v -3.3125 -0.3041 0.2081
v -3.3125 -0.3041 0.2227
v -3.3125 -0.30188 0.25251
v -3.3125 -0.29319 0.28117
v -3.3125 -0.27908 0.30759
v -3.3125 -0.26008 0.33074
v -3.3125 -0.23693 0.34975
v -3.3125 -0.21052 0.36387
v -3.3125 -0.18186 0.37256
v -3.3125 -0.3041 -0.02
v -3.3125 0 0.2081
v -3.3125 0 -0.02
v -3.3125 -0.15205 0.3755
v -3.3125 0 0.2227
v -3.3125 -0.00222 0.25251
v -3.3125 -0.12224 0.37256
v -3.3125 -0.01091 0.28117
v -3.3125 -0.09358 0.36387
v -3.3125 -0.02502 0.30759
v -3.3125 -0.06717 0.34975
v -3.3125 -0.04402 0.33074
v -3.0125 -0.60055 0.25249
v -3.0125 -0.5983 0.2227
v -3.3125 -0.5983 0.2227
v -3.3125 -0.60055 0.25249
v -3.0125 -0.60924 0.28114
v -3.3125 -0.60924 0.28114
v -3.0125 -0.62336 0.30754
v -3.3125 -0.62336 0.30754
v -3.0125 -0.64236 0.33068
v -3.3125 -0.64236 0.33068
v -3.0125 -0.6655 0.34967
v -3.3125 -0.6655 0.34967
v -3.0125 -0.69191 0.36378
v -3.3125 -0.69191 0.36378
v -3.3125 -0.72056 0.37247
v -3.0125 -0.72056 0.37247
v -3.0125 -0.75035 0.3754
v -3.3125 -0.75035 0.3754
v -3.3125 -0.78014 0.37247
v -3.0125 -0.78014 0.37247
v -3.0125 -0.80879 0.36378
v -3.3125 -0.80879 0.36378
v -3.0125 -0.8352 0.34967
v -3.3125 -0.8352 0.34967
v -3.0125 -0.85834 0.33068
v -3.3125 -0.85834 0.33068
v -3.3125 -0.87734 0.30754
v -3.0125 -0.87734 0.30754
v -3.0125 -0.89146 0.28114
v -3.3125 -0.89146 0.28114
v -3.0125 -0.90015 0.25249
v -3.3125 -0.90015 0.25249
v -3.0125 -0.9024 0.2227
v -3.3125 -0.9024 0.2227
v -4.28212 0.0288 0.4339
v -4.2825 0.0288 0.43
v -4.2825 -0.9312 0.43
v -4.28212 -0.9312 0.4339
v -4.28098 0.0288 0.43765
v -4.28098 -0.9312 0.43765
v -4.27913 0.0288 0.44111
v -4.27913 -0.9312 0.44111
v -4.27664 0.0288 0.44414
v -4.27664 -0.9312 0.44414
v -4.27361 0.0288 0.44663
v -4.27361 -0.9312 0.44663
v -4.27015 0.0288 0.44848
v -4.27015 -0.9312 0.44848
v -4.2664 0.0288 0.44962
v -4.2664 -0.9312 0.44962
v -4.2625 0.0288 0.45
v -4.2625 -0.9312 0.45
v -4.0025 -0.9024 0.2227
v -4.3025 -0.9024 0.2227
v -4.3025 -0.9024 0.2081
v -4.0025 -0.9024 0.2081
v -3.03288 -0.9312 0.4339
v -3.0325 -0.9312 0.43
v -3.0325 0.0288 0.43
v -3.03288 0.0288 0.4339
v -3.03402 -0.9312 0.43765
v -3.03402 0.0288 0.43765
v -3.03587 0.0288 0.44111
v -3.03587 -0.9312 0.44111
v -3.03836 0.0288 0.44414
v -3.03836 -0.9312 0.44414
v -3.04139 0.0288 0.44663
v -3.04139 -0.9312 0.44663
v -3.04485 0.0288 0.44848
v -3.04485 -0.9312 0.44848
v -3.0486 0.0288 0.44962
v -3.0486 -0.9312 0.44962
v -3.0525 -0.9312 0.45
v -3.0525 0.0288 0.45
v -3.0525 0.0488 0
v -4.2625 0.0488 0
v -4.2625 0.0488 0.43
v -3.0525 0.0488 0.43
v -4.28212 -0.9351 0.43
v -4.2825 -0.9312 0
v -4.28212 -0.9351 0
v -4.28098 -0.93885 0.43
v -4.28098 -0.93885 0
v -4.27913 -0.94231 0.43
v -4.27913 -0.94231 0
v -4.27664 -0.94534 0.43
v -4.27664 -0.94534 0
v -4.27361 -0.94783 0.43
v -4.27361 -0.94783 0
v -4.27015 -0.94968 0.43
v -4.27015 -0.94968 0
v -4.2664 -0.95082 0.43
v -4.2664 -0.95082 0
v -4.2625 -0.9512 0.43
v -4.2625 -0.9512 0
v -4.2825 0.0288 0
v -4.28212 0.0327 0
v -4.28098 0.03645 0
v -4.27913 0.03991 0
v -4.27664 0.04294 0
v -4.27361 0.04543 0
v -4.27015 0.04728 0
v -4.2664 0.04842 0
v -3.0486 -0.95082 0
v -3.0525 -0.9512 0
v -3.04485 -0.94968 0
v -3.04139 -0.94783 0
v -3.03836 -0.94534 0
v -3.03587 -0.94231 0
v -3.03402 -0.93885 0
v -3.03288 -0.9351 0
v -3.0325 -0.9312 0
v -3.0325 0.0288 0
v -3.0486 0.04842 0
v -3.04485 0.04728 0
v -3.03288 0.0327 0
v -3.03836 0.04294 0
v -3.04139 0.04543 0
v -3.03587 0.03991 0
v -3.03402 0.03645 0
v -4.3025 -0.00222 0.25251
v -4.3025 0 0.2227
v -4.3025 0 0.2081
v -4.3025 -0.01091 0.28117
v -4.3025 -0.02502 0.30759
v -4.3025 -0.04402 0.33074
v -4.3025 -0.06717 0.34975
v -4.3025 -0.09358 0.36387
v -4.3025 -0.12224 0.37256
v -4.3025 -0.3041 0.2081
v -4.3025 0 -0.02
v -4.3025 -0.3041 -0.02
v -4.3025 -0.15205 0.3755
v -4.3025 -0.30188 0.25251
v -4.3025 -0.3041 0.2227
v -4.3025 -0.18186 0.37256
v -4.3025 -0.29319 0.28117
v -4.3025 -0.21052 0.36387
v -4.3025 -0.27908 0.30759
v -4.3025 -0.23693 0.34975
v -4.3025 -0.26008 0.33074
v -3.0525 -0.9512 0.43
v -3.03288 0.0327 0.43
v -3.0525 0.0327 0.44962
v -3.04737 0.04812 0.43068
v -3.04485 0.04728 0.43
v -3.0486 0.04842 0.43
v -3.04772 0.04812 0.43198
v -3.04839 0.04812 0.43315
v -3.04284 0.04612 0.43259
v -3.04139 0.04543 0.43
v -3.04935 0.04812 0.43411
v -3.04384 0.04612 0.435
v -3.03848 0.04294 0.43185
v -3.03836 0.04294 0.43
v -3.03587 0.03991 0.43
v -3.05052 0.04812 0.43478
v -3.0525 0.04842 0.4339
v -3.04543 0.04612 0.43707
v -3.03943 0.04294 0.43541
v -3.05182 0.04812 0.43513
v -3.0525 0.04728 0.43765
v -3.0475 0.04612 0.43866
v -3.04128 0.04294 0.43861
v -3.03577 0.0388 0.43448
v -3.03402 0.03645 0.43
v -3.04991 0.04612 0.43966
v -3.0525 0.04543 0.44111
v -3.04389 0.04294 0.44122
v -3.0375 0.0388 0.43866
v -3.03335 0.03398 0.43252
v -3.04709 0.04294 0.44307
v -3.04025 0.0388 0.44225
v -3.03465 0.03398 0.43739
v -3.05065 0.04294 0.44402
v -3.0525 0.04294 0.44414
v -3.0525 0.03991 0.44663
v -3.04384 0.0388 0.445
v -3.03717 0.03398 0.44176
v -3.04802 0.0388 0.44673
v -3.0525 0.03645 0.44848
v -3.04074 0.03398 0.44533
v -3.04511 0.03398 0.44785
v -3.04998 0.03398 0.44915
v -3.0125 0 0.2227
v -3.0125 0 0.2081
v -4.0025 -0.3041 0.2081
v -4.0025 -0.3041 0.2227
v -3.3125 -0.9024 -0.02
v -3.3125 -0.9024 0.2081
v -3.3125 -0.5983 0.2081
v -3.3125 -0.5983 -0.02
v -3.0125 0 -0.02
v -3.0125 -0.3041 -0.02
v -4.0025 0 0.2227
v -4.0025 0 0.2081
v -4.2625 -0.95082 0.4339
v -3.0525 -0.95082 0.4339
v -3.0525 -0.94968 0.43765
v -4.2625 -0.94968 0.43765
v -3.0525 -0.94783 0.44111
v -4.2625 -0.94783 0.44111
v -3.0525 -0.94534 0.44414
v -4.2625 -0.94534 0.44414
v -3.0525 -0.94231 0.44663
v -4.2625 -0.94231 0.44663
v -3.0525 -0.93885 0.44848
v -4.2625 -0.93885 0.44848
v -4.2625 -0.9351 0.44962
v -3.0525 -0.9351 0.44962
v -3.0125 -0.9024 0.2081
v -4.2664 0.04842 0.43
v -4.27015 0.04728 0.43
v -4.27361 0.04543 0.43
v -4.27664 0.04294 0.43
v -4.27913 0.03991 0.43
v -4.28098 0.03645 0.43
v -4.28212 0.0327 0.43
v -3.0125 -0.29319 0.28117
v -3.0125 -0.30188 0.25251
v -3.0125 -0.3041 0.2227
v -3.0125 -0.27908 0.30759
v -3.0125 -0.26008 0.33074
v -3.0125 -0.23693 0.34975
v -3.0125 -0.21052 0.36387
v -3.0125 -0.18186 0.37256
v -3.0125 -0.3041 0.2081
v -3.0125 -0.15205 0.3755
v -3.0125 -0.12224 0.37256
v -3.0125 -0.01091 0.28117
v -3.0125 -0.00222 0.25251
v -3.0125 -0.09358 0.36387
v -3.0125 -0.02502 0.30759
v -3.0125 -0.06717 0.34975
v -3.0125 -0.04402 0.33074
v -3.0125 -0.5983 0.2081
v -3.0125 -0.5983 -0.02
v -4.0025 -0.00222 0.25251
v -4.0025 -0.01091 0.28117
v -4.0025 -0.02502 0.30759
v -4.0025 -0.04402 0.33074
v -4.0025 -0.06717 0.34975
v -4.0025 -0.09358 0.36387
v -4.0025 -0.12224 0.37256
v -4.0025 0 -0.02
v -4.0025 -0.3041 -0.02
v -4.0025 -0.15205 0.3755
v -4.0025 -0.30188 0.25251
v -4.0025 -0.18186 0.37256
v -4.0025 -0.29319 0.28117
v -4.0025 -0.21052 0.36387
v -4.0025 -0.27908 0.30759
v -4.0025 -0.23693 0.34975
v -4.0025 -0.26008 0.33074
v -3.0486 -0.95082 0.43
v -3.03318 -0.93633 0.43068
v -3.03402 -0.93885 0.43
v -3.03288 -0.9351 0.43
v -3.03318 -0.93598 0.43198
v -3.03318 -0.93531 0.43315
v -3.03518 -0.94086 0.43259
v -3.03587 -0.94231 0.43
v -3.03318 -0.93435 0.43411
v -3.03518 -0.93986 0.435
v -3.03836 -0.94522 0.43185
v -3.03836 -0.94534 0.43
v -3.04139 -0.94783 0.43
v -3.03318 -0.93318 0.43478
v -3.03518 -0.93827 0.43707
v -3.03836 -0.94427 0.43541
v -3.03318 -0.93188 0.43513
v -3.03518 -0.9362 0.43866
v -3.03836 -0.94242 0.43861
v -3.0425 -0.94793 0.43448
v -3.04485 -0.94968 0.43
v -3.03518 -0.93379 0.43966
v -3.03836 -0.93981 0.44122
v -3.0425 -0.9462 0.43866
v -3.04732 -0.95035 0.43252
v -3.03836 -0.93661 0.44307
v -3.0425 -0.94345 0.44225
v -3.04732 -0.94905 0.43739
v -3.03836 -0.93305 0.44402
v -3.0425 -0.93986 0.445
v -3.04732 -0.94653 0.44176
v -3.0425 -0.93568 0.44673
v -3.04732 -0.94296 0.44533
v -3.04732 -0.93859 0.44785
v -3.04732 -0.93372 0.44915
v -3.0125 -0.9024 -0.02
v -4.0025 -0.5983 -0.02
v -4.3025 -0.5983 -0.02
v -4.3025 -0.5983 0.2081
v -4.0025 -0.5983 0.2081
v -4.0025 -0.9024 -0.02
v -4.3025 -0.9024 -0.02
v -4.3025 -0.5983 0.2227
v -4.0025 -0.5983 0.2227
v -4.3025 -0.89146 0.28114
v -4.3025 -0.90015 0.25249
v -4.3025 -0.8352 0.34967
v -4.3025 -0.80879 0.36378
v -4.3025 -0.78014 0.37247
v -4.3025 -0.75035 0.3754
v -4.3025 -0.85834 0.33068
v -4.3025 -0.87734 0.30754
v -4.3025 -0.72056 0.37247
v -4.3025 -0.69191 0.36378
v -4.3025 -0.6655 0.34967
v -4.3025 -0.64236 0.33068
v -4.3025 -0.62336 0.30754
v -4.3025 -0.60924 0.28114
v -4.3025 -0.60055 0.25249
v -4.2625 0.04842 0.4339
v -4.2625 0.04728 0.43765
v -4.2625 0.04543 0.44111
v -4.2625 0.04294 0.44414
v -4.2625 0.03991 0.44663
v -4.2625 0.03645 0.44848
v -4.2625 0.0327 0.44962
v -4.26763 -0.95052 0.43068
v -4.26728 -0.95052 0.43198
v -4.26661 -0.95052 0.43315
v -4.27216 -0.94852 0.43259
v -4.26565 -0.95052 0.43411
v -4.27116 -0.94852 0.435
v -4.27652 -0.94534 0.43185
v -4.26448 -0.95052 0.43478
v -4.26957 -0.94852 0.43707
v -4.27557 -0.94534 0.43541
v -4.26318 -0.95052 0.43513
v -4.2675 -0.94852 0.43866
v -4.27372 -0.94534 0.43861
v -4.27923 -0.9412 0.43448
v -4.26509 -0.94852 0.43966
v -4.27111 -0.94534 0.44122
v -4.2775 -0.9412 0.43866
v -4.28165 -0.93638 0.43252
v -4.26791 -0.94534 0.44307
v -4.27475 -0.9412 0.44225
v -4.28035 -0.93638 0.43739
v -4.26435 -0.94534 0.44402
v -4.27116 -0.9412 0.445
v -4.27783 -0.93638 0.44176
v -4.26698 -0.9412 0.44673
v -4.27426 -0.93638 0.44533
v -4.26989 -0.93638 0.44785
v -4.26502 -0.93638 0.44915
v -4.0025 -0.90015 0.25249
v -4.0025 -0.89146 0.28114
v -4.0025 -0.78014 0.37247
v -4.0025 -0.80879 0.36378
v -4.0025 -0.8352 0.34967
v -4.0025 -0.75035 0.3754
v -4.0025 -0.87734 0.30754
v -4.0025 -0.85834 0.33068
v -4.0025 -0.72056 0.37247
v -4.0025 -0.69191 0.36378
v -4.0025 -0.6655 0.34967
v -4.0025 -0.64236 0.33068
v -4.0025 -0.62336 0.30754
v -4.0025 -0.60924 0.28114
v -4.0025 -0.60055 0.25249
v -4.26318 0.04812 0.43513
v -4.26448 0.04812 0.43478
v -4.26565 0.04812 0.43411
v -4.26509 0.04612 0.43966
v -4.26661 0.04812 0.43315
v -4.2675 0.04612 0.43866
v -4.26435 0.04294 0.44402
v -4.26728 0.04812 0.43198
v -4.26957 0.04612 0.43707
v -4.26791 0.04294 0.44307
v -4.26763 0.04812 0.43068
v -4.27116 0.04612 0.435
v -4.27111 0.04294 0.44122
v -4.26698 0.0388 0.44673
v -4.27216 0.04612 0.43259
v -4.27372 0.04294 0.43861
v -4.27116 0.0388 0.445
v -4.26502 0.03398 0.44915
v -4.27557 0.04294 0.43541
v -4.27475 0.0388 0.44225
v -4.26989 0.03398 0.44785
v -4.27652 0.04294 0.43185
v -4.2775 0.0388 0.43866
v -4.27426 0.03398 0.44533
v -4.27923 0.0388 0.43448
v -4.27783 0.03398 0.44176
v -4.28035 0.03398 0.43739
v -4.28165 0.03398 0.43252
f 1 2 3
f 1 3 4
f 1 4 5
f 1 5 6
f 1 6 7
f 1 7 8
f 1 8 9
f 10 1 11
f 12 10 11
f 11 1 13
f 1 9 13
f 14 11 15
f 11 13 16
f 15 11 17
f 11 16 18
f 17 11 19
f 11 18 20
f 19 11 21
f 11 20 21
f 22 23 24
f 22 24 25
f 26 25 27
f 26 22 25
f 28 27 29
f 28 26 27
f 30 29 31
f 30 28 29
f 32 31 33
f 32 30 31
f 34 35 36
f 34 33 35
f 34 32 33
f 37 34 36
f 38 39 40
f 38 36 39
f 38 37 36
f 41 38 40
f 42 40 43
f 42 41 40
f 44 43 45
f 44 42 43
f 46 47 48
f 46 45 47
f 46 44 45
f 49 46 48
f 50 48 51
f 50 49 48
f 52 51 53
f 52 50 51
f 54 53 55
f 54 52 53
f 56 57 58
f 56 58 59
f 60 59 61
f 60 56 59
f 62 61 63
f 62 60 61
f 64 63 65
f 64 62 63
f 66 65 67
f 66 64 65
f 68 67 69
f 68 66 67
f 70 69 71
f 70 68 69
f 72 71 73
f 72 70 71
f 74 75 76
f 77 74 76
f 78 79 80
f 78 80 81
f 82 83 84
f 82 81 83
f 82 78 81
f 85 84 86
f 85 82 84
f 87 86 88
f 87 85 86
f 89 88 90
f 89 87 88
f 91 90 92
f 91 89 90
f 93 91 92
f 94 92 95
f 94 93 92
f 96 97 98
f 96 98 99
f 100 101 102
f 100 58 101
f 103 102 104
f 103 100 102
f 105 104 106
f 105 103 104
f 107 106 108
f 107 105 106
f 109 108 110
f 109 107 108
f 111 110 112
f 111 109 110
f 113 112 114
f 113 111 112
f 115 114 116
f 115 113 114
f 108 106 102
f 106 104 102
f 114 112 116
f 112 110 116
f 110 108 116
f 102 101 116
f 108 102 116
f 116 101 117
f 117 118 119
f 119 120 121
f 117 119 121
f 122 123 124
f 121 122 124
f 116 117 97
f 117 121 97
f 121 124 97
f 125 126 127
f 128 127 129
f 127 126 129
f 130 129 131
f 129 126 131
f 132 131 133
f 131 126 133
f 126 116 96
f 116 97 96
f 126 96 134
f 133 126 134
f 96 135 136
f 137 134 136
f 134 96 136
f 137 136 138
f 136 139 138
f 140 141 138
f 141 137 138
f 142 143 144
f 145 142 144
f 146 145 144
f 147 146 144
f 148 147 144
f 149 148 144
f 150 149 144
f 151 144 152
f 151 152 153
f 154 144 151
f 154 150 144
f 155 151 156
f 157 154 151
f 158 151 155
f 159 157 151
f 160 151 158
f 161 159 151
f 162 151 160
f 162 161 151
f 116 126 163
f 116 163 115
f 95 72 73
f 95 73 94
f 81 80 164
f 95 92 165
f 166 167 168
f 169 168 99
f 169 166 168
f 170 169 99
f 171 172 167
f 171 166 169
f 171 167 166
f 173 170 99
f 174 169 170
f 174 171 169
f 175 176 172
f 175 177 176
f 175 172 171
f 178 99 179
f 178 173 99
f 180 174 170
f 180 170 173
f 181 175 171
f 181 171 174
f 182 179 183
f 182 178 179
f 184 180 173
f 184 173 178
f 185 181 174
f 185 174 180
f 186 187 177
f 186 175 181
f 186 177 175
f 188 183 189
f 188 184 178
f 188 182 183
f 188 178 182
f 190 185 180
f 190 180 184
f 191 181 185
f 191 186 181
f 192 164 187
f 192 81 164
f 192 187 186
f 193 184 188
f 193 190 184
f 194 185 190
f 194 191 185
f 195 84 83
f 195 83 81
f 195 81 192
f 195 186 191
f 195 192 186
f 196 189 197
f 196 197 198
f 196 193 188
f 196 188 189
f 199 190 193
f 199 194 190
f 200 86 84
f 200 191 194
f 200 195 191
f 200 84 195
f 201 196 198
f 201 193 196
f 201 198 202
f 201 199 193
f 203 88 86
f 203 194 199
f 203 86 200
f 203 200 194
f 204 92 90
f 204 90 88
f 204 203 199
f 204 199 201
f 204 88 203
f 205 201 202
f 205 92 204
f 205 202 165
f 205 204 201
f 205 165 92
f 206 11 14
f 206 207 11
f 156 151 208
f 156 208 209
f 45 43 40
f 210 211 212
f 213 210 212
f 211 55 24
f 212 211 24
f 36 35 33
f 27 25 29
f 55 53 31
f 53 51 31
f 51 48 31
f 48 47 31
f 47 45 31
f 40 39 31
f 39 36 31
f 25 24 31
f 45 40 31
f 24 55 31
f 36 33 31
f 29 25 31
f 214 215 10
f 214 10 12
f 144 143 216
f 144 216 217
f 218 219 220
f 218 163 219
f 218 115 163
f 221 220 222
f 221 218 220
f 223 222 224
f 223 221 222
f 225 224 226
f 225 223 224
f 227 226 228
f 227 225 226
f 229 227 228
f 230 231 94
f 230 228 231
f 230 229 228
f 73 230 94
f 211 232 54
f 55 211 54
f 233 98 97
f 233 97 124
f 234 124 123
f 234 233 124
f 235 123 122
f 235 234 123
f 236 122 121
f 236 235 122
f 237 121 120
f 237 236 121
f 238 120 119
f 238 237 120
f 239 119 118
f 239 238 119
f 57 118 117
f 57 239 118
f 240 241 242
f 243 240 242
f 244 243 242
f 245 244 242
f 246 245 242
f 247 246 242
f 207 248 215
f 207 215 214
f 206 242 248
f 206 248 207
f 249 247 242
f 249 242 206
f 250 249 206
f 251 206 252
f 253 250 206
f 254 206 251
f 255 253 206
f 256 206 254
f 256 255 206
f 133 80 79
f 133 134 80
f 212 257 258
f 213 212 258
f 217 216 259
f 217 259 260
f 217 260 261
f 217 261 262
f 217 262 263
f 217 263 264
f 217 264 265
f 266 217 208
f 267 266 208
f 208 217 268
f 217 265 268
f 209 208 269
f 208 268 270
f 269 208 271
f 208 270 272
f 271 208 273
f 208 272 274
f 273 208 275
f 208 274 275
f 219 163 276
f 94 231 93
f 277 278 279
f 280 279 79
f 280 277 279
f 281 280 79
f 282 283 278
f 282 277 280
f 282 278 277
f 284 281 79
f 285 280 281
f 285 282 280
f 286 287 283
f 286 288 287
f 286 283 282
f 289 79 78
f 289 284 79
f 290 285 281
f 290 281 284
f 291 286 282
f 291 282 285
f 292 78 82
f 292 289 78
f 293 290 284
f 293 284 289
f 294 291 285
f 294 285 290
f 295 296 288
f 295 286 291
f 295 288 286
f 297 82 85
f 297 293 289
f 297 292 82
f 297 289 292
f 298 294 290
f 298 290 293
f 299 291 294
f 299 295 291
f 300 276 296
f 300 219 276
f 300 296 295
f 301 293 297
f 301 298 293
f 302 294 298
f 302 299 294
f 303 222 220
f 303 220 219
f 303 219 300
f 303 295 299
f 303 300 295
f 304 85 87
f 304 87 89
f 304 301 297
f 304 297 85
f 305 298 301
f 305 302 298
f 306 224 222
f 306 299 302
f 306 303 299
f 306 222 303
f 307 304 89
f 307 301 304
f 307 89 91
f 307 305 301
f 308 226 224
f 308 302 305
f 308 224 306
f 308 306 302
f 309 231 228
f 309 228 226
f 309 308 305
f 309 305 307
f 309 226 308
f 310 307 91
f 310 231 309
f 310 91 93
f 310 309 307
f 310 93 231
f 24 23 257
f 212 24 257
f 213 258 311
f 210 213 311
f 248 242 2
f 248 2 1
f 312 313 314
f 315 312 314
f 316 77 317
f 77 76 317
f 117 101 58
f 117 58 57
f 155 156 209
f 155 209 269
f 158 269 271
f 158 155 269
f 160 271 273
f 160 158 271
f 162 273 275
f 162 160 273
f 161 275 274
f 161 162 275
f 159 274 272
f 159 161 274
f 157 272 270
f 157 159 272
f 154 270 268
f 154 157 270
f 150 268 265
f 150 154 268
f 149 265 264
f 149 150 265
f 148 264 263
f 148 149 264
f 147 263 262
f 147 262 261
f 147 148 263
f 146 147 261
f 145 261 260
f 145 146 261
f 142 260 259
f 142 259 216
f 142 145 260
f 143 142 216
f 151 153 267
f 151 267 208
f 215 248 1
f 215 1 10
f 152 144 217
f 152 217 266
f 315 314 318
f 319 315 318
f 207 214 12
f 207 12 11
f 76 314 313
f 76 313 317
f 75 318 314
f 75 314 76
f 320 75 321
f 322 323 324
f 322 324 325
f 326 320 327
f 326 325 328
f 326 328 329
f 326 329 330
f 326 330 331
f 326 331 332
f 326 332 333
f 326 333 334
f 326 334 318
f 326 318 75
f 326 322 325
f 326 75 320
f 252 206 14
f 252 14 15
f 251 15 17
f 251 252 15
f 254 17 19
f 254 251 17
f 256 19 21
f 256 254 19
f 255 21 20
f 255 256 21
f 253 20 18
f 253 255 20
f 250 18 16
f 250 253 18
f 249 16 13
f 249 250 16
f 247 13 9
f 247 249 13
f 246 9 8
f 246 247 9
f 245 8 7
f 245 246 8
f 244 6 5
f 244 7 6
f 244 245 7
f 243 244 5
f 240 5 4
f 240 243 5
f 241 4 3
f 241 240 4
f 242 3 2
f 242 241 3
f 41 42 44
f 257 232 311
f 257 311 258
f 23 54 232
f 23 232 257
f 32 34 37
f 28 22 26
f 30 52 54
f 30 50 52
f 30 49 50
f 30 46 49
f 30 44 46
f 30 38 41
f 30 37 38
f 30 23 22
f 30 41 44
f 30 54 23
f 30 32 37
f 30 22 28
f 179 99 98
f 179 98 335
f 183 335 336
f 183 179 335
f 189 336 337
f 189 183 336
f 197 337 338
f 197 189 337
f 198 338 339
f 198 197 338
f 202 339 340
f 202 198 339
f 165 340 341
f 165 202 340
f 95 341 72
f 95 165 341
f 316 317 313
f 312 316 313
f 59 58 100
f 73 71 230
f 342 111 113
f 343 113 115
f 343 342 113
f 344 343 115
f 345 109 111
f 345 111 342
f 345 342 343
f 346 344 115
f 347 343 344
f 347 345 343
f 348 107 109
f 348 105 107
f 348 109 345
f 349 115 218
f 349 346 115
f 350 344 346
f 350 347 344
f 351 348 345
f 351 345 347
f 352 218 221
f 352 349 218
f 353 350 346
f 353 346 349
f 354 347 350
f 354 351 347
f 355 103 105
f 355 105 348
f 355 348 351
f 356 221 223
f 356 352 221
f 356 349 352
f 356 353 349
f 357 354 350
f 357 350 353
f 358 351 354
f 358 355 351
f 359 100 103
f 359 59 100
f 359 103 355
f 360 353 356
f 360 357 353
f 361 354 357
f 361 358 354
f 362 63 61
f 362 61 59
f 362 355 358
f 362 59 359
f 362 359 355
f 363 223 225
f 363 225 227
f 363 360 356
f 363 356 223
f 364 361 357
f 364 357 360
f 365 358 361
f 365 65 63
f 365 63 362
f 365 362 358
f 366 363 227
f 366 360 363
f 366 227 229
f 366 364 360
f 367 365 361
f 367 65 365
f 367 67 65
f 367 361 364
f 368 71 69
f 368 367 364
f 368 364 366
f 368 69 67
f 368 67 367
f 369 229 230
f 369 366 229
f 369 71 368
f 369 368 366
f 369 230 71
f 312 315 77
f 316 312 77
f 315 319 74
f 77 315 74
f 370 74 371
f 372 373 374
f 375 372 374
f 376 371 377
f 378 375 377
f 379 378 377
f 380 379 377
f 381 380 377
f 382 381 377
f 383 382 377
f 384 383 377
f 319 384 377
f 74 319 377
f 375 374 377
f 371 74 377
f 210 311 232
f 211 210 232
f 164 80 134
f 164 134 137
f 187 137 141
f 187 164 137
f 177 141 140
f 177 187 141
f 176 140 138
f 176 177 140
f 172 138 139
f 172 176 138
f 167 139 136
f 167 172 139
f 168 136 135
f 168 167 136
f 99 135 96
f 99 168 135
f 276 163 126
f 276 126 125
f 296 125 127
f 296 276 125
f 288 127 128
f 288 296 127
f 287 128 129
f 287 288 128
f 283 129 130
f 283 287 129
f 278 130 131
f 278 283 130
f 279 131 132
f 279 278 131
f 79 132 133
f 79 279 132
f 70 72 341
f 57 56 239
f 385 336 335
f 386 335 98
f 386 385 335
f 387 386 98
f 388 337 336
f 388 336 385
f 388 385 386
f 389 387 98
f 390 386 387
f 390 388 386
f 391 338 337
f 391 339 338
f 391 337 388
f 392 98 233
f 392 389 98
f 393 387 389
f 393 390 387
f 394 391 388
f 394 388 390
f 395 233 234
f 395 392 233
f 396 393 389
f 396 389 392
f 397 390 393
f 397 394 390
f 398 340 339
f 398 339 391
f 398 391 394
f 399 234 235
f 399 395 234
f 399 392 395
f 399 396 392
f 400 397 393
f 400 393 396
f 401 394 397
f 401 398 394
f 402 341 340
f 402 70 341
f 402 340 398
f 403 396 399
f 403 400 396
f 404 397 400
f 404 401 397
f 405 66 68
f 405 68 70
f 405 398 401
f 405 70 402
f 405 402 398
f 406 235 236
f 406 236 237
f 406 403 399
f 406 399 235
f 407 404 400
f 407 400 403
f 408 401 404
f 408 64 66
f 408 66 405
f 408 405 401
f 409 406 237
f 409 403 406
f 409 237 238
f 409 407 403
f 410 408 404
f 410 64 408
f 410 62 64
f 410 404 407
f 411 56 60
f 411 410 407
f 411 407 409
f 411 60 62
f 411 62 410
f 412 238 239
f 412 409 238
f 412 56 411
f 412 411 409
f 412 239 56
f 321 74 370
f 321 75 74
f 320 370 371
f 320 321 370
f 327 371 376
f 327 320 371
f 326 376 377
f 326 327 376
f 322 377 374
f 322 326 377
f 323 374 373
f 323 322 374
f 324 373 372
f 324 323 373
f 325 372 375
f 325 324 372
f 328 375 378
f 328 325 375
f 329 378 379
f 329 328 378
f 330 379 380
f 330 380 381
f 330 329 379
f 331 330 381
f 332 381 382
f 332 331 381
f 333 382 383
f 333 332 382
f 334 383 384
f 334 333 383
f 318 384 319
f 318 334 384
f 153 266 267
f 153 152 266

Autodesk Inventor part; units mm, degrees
ref_plane "YZ Plane" through (0, 0, 0) normal (1, 0, 0) x (0, 1, 0)
ref_plane "XZ Plane" through (0, 0, 0) normal (0, 1, 0) x (-1, 0, 0)
sketch "Boceto1" plane through (0, 0, 0) normal (0, 0, 1) x (1, 0, 0)
  line L0 (-4.2825, 0.0488) -> (-3.0325, 0.0488)
  line L1 (-3.0325, 0.0488) -> (-3.0325, -0.9512)
  line L2 (-3.0325, -0.9512) -> (-4.2825, -0.9512)
  line L3 (-4.2825, -0.9512) -> (-4.2825, 0.0488)
  point P0 (0, 0)
  dimension "d0" = 1.25
  dimension "d1" = 1
extrude "Extrusión1" add sketch "Boceto1" along normal blind 0.45
ref_plane "Plano de trabajo1" through (-4.2825, -0.9512, 0.45) normal (-1, 0, 0) x (0, -1, 0)
sketch "Boceto2" plane through (-4.2825, -0.9512, 0.45) normal (-1, 0, 0) x (0, -1, 0)
  line L0 (-0.9512, -0.45) -> (-0.6471, -0.45)
  line L1 (-0.6471, -0.45) -> (-0.6471, -0.2073)
  line L2 (-0.9512, -0.2073) -> (-0.9512, -0.45)
  arc A0 (-0.6471, -0.2219) -> (-0.9512, -0.2219) centre (-0.7992, -0.2073) ccw
  line L3 (0, -0.45) -> (-1, -0.45) projected
  line L4 (-0.0488, -0.45) -> (-0.3529, -0.45)
  line L5 (-0.3529, -0.45) -> (-0.3529, -0.2073)
  line L6 (-0.0488, -0.2073) -> (-0.0488, -0.45)
  arc A1 (-0.0488, -0.2219) -> (-0.3529, -0.2219) centre (-0.2008, -0.2073) ccw
extrude "Extrusión2" add sketch "Boceto2" against normal blind 0.3 separate body
move or copy body "Desplazar1" bodies to move or copy 2 copy no translate (-0.02, 0, -0.02)
ref_plane "Plano de trabajo3" through (-3.6575, 0.0488, 0.45) normal (1, 0, 0) x (0, 1, 0)
ref_plane "Plano de trabajo2" through (-3.0325, 0.0488, 0.45) normal (1, 0, 0) x (0, 1, 0)
mirror "Simetría1" about plane through (-3.6575, 0.0488, 0.45) normal (1, 0, 0) bodies 2
fillet "Empalme1" radius 0.02 8 edges at (-4.2825, -0.4512, 0.45) (-3.6575, -0.9512, 0.45) (-3.0325, -0.4512, 0.45) (-3.0325, -0.9512, 0.225) (-4.2825, -0.9512, 0.225) (-4.2825, 0.0488, 0.225) (-3.6575, 0.0488, 0.45) (-3.0325, 0.0488, 0.225)
properties part number "4pin_smd"
